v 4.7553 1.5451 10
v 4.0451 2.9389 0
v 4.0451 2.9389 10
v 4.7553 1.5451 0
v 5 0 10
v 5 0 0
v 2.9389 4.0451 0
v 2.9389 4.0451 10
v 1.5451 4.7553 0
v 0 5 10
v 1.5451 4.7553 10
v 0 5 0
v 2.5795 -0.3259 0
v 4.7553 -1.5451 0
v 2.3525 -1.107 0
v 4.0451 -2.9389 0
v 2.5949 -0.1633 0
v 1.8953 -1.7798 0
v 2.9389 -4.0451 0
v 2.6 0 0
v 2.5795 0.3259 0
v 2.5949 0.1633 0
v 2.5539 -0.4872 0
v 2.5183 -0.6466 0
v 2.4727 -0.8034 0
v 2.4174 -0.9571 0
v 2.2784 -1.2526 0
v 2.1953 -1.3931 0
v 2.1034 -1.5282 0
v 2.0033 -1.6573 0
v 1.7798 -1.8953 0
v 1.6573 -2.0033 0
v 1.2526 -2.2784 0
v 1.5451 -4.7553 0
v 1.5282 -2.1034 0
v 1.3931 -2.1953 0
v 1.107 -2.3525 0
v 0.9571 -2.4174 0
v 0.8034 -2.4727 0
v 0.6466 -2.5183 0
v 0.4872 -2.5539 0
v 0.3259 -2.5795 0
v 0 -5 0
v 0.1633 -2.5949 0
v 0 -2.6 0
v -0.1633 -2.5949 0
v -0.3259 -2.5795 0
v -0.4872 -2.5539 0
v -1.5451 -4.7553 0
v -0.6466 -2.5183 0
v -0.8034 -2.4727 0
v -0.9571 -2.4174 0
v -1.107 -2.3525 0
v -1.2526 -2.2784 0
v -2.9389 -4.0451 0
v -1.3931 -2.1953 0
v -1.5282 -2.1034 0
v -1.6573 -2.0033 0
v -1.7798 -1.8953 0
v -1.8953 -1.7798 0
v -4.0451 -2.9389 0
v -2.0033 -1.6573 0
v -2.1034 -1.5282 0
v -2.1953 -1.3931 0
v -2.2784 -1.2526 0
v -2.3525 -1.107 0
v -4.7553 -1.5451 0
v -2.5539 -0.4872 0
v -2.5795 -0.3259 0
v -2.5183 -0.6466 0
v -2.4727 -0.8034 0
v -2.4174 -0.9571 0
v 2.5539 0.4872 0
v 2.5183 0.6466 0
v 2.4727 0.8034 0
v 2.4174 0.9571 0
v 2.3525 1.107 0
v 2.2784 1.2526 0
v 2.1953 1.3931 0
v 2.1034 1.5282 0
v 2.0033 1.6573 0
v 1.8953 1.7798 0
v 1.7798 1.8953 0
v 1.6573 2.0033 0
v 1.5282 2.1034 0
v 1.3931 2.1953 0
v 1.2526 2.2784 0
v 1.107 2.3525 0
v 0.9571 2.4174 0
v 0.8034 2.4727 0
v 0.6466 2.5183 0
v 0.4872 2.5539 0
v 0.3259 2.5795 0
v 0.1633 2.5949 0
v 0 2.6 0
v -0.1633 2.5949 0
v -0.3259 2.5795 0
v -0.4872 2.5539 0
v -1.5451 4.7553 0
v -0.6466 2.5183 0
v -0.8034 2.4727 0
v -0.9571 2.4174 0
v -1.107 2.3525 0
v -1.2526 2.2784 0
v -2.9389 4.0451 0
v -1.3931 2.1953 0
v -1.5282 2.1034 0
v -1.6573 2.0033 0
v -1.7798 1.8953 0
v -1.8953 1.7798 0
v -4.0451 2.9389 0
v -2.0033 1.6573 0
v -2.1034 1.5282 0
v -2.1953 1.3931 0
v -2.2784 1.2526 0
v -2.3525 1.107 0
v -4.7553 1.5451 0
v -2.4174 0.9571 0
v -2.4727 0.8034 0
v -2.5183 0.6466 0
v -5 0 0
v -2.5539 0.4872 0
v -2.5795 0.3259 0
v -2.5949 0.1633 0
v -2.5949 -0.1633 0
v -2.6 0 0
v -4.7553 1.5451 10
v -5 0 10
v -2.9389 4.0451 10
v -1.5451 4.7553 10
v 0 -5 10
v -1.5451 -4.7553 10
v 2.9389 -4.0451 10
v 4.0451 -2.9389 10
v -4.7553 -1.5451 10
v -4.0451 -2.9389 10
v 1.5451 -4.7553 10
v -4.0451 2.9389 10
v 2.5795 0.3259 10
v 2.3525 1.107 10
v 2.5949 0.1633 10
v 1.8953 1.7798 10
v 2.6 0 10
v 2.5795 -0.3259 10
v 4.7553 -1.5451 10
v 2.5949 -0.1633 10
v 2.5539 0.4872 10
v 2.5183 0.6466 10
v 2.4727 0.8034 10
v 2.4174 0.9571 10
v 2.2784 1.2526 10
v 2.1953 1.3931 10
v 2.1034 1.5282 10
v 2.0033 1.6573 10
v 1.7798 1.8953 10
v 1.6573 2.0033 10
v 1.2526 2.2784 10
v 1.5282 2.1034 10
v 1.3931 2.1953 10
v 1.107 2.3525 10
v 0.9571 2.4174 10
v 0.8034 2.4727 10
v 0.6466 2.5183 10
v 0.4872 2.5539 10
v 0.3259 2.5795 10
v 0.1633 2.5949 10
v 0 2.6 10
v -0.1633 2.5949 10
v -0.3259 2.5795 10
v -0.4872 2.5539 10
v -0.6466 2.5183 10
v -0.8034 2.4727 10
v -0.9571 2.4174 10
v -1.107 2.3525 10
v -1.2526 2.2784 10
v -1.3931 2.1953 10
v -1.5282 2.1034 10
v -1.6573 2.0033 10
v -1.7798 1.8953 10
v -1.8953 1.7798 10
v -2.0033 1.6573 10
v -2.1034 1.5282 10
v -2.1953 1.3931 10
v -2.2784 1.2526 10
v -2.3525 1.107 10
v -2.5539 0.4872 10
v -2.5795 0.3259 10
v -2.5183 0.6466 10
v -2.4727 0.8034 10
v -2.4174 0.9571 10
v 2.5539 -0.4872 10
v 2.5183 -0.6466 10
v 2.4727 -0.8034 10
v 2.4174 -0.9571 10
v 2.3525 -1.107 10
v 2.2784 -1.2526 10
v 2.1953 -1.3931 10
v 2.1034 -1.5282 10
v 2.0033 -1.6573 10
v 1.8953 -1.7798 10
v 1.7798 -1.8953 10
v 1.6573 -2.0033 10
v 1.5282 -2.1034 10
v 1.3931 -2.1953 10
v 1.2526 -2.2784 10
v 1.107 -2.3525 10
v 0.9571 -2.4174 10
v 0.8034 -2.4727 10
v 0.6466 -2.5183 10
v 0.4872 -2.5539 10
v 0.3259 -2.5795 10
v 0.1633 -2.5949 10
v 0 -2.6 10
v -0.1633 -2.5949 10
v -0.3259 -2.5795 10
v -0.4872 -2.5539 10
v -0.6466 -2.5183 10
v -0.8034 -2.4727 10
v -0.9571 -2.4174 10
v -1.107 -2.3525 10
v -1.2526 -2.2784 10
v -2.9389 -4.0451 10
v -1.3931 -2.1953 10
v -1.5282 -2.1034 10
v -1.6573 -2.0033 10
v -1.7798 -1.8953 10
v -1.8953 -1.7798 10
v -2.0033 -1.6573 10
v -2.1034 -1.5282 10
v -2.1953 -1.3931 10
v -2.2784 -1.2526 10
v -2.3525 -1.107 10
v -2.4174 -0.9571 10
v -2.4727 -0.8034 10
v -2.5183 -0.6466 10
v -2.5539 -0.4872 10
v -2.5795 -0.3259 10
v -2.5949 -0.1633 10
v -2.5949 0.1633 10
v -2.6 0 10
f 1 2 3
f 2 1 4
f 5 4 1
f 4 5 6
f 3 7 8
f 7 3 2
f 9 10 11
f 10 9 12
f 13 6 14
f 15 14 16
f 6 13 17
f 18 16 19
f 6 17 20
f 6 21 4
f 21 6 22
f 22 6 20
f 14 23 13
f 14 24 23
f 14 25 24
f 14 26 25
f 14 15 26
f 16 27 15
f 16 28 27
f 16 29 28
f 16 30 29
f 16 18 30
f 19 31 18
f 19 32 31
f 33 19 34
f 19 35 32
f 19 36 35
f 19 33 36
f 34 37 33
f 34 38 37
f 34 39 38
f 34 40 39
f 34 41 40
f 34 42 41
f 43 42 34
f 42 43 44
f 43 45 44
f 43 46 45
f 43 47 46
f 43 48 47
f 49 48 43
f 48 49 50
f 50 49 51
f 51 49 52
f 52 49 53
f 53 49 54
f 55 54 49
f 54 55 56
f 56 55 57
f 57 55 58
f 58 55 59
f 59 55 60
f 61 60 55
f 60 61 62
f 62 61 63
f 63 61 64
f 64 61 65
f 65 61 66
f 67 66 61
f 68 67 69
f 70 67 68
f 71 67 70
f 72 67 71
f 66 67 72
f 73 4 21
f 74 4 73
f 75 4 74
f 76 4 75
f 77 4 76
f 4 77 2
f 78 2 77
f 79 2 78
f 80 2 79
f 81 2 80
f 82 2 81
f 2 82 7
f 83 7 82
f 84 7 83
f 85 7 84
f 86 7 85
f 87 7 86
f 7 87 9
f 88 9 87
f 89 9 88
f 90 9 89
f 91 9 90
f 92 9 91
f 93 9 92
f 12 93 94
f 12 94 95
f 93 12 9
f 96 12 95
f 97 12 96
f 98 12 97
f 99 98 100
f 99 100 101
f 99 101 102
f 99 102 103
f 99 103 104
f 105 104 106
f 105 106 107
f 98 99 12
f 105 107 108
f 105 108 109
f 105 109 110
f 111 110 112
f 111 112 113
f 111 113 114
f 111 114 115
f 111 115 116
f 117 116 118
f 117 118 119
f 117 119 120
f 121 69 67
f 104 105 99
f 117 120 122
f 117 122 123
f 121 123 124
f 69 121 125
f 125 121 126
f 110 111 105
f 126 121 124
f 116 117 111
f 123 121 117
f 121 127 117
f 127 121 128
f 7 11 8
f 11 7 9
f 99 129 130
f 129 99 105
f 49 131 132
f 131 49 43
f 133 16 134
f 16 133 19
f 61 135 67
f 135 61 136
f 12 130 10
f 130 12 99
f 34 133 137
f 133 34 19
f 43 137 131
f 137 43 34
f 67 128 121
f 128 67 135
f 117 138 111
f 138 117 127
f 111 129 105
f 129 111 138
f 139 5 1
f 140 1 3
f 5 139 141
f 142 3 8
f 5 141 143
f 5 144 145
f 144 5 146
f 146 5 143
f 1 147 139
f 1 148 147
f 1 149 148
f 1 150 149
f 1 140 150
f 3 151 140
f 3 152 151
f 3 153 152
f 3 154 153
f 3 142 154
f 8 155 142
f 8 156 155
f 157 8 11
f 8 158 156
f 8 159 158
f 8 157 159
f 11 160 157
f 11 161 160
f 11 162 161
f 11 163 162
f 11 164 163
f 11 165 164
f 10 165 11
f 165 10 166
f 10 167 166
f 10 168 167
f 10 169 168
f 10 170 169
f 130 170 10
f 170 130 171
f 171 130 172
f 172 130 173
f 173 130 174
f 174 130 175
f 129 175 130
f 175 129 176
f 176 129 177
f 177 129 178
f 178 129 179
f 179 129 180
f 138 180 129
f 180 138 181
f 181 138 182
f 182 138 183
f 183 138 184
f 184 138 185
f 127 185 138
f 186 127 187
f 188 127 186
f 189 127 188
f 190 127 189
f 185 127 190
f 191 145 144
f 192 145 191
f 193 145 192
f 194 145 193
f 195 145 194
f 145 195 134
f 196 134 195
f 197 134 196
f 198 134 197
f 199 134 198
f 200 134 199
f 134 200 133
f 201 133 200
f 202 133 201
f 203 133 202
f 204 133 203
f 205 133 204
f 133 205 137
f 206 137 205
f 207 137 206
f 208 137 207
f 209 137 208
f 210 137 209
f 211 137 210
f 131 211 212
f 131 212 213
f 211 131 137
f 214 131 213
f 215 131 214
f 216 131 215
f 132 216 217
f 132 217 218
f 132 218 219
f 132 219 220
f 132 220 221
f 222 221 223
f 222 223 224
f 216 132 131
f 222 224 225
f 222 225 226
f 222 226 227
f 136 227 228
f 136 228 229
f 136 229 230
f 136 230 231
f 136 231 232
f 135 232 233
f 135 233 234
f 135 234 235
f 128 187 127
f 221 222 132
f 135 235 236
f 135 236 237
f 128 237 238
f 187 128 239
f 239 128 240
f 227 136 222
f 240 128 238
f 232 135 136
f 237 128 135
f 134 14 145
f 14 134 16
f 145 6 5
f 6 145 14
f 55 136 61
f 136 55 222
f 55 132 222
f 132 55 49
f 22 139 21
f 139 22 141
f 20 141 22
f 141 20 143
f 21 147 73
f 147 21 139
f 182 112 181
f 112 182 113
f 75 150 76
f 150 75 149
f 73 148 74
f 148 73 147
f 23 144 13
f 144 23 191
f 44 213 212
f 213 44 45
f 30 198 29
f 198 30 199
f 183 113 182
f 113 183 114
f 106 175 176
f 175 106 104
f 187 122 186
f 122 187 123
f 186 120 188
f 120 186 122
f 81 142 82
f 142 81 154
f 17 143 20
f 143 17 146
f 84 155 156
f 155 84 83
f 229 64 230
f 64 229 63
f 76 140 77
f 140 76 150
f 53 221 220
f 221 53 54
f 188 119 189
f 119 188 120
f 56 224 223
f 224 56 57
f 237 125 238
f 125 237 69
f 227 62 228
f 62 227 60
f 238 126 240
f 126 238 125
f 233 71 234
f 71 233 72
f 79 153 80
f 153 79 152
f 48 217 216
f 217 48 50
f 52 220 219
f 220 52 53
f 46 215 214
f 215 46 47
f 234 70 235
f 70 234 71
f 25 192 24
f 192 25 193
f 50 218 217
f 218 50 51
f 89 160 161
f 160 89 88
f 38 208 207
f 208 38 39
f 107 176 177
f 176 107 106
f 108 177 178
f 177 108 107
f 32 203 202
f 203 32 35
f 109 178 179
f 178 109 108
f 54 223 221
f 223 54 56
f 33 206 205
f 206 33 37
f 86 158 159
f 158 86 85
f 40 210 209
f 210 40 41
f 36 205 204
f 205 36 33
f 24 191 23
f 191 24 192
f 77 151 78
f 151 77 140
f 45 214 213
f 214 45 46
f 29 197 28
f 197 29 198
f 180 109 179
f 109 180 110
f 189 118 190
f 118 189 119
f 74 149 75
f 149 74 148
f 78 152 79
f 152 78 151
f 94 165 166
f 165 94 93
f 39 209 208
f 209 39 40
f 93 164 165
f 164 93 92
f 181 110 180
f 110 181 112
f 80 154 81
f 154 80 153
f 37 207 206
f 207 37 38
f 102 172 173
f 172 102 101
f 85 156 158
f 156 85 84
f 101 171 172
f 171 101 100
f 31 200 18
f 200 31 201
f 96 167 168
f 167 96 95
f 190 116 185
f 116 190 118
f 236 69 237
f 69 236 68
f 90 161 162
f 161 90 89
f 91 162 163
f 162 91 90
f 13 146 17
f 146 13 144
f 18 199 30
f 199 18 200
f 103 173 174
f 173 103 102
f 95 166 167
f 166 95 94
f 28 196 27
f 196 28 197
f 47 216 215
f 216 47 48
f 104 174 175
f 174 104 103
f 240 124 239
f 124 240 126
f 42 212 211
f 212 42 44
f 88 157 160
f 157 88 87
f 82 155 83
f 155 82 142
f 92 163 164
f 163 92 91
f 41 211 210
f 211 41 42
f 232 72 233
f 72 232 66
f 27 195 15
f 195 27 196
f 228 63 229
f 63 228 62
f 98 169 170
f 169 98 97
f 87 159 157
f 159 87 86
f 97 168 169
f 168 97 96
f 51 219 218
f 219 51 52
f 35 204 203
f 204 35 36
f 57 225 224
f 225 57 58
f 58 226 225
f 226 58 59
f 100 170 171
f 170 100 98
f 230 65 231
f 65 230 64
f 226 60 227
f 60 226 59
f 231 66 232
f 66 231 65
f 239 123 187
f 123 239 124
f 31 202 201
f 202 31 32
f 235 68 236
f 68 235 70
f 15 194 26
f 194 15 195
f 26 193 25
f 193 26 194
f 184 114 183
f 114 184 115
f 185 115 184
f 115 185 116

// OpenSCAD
//-------------------------------------------------------------
//-- Axle cap
//-------------------------------------------------------------

gap              = 0.2;
cap_diam         = 10;
cap_length       = 10;
axle_diam        = 5;
axle_hole_length = 50;



//-------------------------------------------------------
//--  A cap for the axle
//--------------------------------------------------------
module axle_cap()
{
  difference() {
    // Cap
    cylinder(h=cap_length, d=cap_diam, $fn=20);

    // Axle
    cylinder(h=axle_hole_length, d=axle_diam+gap, $fn=100);    
  }
}


//-- Test!
axle_cap();
